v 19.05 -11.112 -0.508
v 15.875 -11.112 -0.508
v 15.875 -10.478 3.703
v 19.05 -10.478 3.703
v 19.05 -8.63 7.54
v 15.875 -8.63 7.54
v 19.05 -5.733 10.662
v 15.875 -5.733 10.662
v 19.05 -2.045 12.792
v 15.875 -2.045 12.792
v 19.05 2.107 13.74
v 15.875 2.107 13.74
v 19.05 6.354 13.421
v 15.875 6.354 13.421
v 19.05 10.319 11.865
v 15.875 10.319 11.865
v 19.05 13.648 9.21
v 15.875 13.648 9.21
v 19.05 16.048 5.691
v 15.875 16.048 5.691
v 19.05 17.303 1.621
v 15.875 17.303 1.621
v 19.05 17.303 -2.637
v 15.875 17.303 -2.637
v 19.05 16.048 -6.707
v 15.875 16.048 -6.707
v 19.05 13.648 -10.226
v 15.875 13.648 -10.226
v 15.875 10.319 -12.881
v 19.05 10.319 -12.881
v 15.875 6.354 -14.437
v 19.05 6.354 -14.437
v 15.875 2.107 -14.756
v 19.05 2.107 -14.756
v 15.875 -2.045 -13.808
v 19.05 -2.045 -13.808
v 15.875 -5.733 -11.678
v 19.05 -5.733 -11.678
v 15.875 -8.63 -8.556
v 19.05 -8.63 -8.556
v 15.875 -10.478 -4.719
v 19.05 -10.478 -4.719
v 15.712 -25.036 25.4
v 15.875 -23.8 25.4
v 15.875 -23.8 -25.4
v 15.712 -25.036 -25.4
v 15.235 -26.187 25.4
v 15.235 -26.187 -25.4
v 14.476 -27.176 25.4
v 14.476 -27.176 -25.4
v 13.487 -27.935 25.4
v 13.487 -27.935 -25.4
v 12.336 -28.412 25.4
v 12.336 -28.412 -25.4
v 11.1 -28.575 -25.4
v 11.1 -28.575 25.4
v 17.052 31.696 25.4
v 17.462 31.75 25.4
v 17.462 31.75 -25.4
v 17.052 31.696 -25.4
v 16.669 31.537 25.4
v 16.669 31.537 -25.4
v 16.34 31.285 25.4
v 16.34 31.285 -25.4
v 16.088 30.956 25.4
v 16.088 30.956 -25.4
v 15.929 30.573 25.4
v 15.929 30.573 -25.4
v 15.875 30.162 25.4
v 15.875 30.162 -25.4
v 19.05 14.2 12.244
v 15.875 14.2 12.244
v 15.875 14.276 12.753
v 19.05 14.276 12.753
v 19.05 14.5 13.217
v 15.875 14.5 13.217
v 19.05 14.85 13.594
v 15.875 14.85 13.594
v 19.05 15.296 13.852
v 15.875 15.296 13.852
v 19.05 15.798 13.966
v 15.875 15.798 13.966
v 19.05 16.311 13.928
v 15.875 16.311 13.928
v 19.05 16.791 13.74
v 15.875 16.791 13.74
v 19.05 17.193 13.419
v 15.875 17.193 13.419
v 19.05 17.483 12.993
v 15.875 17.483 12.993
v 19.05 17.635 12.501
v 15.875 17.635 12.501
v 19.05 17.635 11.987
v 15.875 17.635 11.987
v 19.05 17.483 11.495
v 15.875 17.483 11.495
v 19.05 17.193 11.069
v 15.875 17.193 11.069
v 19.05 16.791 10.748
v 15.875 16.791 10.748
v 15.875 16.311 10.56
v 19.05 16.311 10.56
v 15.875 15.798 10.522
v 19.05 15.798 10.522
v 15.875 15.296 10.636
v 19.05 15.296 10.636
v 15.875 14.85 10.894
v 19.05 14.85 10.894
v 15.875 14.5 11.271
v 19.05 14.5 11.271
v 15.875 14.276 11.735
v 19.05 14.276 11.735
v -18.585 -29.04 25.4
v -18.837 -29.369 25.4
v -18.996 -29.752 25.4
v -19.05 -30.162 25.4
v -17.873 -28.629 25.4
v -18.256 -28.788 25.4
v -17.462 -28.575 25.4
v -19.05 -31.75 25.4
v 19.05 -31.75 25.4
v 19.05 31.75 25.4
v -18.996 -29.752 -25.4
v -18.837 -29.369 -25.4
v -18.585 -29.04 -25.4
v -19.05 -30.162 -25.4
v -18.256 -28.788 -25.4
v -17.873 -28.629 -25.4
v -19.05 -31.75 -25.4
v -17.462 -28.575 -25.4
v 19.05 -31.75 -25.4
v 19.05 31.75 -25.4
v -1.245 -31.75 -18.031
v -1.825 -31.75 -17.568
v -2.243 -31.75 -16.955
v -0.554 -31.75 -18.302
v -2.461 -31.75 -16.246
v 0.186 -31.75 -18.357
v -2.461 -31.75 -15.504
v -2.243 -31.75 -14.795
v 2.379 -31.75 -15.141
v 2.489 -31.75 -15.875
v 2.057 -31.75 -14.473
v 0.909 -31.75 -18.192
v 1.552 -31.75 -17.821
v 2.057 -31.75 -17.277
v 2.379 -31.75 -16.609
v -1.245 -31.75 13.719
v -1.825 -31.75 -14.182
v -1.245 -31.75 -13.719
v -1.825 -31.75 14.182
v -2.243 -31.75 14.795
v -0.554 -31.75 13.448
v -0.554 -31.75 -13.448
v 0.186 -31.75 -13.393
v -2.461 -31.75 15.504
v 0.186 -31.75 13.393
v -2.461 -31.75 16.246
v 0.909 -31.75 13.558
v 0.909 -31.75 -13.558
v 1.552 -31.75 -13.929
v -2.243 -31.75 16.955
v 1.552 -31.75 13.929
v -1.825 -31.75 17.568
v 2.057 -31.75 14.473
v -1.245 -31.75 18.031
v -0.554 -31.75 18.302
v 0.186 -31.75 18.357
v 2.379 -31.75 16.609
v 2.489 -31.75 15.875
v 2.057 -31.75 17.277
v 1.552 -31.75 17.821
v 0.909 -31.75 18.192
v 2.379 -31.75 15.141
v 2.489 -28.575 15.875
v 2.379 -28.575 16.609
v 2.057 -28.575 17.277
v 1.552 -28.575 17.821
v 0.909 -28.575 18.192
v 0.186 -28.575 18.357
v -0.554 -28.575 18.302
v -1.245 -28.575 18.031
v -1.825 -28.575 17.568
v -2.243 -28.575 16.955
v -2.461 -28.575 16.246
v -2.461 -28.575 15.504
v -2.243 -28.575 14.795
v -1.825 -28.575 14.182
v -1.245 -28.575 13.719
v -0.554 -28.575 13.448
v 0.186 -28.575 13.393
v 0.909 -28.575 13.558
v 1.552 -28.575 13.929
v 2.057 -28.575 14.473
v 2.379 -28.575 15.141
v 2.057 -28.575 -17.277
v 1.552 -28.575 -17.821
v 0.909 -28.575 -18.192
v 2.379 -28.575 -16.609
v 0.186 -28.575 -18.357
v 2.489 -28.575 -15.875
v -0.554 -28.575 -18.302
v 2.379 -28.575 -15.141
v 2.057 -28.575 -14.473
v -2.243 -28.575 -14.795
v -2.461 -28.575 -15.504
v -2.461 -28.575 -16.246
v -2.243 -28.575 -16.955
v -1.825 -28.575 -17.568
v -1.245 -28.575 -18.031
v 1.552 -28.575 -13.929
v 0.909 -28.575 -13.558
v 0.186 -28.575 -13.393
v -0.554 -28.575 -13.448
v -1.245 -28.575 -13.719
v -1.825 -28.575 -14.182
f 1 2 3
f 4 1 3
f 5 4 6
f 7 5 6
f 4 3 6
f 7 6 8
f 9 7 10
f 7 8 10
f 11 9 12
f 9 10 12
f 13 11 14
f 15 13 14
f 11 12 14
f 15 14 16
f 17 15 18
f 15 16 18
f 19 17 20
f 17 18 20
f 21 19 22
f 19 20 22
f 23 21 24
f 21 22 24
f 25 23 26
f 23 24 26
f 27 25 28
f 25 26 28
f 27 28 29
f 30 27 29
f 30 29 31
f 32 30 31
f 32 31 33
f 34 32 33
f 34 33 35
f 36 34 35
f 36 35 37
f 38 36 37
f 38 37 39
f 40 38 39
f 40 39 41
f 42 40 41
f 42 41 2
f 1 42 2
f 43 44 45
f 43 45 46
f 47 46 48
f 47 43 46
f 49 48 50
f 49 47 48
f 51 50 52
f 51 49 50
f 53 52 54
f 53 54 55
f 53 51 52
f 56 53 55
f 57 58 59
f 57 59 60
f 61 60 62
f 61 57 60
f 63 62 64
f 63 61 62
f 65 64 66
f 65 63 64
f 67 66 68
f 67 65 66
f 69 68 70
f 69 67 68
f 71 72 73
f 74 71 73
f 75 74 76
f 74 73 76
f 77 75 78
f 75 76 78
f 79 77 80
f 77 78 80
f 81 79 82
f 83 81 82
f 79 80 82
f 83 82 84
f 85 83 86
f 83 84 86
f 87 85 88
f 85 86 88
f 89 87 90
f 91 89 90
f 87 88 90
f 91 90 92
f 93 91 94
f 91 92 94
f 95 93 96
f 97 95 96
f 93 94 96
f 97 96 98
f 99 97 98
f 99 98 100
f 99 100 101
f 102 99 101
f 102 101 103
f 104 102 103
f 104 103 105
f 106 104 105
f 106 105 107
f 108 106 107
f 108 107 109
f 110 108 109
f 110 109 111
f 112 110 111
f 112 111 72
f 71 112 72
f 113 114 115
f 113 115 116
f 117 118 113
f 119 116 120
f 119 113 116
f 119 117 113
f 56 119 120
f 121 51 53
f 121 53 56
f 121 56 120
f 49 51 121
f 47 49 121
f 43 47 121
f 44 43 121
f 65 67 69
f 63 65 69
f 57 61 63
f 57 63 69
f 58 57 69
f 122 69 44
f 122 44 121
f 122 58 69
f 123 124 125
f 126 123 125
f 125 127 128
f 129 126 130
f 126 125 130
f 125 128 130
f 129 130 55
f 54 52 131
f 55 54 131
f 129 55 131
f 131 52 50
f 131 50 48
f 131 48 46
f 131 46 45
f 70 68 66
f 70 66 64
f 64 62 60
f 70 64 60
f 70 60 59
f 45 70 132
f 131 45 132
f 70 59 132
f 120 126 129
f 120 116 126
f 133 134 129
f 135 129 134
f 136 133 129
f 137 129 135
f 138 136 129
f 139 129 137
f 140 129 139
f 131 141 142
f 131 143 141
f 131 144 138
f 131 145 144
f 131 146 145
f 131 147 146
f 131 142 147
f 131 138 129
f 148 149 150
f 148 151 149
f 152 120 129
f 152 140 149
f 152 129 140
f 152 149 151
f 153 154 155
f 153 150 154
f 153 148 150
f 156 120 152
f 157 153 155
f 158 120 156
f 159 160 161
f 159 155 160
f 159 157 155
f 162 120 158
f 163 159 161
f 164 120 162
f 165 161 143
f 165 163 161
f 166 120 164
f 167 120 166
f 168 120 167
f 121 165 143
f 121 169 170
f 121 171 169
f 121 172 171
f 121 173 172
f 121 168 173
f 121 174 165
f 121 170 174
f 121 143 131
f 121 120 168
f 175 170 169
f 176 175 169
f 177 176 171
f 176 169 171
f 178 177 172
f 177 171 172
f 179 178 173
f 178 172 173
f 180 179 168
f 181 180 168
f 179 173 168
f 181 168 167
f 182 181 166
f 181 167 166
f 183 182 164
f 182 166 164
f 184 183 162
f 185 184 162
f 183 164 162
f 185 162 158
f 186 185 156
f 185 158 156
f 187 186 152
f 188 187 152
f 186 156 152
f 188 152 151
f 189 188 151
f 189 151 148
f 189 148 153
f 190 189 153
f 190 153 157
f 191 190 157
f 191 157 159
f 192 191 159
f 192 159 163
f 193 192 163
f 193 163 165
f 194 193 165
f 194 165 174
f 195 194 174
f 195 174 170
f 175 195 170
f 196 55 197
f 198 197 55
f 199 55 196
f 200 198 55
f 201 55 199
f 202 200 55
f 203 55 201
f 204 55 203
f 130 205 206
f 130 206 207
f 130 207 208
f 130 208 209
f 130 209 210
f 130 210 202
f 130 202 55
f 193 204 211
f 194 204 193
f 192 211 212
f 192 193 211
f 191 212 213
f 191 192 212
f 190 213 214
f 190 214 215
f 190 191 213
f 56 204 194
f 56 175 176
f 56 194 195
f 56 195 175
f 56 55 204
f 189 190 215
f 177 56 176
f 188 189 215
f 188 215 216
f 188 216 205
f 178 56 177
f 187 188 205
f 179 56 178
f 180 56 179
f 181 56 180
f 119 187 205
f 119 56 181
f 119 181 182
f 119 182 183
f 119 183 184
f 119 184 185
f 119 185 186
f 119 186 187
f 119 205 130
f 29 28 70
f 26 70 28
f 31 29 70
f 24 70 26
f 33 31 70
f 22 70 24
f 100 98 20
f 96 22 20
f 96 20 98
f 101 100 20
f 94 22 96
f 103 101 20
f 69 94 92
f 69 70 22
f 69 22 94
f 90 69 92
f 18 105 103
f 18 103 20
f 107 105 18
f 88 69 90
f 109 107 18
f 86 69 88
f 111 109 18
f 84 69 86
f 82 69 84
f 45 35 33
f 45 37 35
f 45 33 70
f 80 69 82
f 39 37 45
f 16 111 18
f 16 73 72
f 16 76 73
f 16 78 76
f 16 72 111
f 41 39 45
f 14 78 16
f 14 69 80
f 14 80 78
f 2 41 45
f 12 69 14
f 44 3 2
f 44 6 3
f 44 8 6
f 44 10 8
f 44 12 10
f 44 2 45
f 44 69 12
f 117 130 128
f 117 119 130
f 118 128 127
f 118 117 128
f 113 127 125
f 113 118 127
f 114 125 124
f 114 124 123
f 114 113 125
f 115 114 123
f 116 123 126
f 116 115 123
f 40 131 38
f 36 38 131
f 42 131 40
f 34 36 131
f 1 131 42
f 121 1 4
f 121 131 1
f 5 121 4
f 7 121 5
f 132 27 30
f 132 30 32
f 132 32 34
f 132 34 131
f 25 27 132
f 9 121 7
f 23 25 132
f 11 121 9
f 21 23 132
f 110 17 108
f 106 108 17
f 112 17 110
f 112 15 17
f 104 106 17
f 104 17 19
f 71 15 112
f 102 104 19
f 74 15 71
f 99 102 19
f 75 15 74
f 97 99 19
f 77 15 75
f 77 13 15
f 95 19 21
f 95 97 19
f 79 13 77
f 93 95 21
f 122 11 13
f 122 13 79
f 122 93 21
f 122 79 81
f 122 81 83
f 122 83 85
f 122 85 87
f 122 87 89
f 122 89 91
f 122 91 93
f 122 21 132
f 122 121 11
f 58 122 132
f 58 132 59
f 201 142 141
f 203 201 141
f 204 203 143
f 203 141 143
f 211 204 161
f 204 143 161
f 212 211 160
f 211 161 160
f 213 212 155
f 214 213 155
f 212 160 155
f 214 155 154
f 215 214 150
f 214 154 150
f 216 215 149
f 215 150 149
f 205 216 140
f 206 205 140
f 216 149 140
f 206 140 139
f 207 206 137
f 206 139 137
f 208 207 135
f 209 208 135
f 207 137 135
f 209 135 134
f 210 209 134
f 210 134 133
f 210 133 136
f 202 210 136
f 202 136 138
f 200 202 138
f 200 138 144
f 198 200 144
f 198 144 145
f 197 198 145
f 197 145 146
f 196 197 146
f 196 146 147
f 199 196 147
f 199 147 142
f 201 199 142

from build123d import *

# Parameters (mm, degrees)
BOSS_EXTRUDE1_DEPTH = 25.4
SKETCH3_R           = 14.2875
SKETCH3_R_2         = 1.7272
CUT_EXTRUDE1_DEPTH  = 54.600169076
SKETCH9_R           = 2.4892
CUT_EXTRUDE2_DEPTH  = 71.995158286


with BuildPart() as part:
    # Sketch2 → Boss-Extrude1 (new, symmetric)
    with BuildSketch(Plane.XY):
        with BuildLine():
            Line((-19.05, -31.75), (19.05, -31.75))
            Line((19.05, -31.75), (19.05, 31.75))
            Line((19.05, 31.75), (17.4625, 31.75))
            ThreePointArc((17.4625, 31.75), (16.339967985, 31.285032015), (15.875, 30.1625))
            Line((15.875, 30.1625), (15.875, -23.7998))
            ThreePointArc((15.875, -23.7998), (14.476376302, -27.176376302), (11.0998, -28.575))
            Line((11.0998, -28.575), (-17.4625, -28.575))
            ThreePointArc((-17.4625, -28.575), (-18.585032015, -29.039967985), (-19.05, -30.1625))
            Line((-19.05, -30.1625), (-19.05, -31.75))
        make_face()
    extrude(amount=BOSS_EXTRUDE1_DEPTH, both=True)

    # Sketch3 → Cut-Extrude1 (cut, through all)
    with BuildSketch(Plane.ZY.offset(-15.875)):
        with Locations(Location((-0.50799991, 3.175, 0), (0, 0, 270))):
            Circle(SKETCH3_R)
        with Locations(Location((12.243963782, 15.926963692, 0), (0, 0, 270))):
            Circle(SKETCH3_R_2)
    extrude(amount=-CUT_EXTRUDE1_DEPTH, mode=Mode.SUBTRACT)

    # Sketch9 → Cut-Extrude2 (cut, through all)
    with BuildSketch(Plane.XZ.offset(31.75)):
        with Locations((0, 15.875)):
            Circle(SKETCH9_R)
        with Locations((0, -15.875)):
            Circle(SKETCH9_R)
    extrude(amount=-CUT_EXTRUDE2_DEPTH, mode=Mode.SUBTRACT)


solid = part.part
